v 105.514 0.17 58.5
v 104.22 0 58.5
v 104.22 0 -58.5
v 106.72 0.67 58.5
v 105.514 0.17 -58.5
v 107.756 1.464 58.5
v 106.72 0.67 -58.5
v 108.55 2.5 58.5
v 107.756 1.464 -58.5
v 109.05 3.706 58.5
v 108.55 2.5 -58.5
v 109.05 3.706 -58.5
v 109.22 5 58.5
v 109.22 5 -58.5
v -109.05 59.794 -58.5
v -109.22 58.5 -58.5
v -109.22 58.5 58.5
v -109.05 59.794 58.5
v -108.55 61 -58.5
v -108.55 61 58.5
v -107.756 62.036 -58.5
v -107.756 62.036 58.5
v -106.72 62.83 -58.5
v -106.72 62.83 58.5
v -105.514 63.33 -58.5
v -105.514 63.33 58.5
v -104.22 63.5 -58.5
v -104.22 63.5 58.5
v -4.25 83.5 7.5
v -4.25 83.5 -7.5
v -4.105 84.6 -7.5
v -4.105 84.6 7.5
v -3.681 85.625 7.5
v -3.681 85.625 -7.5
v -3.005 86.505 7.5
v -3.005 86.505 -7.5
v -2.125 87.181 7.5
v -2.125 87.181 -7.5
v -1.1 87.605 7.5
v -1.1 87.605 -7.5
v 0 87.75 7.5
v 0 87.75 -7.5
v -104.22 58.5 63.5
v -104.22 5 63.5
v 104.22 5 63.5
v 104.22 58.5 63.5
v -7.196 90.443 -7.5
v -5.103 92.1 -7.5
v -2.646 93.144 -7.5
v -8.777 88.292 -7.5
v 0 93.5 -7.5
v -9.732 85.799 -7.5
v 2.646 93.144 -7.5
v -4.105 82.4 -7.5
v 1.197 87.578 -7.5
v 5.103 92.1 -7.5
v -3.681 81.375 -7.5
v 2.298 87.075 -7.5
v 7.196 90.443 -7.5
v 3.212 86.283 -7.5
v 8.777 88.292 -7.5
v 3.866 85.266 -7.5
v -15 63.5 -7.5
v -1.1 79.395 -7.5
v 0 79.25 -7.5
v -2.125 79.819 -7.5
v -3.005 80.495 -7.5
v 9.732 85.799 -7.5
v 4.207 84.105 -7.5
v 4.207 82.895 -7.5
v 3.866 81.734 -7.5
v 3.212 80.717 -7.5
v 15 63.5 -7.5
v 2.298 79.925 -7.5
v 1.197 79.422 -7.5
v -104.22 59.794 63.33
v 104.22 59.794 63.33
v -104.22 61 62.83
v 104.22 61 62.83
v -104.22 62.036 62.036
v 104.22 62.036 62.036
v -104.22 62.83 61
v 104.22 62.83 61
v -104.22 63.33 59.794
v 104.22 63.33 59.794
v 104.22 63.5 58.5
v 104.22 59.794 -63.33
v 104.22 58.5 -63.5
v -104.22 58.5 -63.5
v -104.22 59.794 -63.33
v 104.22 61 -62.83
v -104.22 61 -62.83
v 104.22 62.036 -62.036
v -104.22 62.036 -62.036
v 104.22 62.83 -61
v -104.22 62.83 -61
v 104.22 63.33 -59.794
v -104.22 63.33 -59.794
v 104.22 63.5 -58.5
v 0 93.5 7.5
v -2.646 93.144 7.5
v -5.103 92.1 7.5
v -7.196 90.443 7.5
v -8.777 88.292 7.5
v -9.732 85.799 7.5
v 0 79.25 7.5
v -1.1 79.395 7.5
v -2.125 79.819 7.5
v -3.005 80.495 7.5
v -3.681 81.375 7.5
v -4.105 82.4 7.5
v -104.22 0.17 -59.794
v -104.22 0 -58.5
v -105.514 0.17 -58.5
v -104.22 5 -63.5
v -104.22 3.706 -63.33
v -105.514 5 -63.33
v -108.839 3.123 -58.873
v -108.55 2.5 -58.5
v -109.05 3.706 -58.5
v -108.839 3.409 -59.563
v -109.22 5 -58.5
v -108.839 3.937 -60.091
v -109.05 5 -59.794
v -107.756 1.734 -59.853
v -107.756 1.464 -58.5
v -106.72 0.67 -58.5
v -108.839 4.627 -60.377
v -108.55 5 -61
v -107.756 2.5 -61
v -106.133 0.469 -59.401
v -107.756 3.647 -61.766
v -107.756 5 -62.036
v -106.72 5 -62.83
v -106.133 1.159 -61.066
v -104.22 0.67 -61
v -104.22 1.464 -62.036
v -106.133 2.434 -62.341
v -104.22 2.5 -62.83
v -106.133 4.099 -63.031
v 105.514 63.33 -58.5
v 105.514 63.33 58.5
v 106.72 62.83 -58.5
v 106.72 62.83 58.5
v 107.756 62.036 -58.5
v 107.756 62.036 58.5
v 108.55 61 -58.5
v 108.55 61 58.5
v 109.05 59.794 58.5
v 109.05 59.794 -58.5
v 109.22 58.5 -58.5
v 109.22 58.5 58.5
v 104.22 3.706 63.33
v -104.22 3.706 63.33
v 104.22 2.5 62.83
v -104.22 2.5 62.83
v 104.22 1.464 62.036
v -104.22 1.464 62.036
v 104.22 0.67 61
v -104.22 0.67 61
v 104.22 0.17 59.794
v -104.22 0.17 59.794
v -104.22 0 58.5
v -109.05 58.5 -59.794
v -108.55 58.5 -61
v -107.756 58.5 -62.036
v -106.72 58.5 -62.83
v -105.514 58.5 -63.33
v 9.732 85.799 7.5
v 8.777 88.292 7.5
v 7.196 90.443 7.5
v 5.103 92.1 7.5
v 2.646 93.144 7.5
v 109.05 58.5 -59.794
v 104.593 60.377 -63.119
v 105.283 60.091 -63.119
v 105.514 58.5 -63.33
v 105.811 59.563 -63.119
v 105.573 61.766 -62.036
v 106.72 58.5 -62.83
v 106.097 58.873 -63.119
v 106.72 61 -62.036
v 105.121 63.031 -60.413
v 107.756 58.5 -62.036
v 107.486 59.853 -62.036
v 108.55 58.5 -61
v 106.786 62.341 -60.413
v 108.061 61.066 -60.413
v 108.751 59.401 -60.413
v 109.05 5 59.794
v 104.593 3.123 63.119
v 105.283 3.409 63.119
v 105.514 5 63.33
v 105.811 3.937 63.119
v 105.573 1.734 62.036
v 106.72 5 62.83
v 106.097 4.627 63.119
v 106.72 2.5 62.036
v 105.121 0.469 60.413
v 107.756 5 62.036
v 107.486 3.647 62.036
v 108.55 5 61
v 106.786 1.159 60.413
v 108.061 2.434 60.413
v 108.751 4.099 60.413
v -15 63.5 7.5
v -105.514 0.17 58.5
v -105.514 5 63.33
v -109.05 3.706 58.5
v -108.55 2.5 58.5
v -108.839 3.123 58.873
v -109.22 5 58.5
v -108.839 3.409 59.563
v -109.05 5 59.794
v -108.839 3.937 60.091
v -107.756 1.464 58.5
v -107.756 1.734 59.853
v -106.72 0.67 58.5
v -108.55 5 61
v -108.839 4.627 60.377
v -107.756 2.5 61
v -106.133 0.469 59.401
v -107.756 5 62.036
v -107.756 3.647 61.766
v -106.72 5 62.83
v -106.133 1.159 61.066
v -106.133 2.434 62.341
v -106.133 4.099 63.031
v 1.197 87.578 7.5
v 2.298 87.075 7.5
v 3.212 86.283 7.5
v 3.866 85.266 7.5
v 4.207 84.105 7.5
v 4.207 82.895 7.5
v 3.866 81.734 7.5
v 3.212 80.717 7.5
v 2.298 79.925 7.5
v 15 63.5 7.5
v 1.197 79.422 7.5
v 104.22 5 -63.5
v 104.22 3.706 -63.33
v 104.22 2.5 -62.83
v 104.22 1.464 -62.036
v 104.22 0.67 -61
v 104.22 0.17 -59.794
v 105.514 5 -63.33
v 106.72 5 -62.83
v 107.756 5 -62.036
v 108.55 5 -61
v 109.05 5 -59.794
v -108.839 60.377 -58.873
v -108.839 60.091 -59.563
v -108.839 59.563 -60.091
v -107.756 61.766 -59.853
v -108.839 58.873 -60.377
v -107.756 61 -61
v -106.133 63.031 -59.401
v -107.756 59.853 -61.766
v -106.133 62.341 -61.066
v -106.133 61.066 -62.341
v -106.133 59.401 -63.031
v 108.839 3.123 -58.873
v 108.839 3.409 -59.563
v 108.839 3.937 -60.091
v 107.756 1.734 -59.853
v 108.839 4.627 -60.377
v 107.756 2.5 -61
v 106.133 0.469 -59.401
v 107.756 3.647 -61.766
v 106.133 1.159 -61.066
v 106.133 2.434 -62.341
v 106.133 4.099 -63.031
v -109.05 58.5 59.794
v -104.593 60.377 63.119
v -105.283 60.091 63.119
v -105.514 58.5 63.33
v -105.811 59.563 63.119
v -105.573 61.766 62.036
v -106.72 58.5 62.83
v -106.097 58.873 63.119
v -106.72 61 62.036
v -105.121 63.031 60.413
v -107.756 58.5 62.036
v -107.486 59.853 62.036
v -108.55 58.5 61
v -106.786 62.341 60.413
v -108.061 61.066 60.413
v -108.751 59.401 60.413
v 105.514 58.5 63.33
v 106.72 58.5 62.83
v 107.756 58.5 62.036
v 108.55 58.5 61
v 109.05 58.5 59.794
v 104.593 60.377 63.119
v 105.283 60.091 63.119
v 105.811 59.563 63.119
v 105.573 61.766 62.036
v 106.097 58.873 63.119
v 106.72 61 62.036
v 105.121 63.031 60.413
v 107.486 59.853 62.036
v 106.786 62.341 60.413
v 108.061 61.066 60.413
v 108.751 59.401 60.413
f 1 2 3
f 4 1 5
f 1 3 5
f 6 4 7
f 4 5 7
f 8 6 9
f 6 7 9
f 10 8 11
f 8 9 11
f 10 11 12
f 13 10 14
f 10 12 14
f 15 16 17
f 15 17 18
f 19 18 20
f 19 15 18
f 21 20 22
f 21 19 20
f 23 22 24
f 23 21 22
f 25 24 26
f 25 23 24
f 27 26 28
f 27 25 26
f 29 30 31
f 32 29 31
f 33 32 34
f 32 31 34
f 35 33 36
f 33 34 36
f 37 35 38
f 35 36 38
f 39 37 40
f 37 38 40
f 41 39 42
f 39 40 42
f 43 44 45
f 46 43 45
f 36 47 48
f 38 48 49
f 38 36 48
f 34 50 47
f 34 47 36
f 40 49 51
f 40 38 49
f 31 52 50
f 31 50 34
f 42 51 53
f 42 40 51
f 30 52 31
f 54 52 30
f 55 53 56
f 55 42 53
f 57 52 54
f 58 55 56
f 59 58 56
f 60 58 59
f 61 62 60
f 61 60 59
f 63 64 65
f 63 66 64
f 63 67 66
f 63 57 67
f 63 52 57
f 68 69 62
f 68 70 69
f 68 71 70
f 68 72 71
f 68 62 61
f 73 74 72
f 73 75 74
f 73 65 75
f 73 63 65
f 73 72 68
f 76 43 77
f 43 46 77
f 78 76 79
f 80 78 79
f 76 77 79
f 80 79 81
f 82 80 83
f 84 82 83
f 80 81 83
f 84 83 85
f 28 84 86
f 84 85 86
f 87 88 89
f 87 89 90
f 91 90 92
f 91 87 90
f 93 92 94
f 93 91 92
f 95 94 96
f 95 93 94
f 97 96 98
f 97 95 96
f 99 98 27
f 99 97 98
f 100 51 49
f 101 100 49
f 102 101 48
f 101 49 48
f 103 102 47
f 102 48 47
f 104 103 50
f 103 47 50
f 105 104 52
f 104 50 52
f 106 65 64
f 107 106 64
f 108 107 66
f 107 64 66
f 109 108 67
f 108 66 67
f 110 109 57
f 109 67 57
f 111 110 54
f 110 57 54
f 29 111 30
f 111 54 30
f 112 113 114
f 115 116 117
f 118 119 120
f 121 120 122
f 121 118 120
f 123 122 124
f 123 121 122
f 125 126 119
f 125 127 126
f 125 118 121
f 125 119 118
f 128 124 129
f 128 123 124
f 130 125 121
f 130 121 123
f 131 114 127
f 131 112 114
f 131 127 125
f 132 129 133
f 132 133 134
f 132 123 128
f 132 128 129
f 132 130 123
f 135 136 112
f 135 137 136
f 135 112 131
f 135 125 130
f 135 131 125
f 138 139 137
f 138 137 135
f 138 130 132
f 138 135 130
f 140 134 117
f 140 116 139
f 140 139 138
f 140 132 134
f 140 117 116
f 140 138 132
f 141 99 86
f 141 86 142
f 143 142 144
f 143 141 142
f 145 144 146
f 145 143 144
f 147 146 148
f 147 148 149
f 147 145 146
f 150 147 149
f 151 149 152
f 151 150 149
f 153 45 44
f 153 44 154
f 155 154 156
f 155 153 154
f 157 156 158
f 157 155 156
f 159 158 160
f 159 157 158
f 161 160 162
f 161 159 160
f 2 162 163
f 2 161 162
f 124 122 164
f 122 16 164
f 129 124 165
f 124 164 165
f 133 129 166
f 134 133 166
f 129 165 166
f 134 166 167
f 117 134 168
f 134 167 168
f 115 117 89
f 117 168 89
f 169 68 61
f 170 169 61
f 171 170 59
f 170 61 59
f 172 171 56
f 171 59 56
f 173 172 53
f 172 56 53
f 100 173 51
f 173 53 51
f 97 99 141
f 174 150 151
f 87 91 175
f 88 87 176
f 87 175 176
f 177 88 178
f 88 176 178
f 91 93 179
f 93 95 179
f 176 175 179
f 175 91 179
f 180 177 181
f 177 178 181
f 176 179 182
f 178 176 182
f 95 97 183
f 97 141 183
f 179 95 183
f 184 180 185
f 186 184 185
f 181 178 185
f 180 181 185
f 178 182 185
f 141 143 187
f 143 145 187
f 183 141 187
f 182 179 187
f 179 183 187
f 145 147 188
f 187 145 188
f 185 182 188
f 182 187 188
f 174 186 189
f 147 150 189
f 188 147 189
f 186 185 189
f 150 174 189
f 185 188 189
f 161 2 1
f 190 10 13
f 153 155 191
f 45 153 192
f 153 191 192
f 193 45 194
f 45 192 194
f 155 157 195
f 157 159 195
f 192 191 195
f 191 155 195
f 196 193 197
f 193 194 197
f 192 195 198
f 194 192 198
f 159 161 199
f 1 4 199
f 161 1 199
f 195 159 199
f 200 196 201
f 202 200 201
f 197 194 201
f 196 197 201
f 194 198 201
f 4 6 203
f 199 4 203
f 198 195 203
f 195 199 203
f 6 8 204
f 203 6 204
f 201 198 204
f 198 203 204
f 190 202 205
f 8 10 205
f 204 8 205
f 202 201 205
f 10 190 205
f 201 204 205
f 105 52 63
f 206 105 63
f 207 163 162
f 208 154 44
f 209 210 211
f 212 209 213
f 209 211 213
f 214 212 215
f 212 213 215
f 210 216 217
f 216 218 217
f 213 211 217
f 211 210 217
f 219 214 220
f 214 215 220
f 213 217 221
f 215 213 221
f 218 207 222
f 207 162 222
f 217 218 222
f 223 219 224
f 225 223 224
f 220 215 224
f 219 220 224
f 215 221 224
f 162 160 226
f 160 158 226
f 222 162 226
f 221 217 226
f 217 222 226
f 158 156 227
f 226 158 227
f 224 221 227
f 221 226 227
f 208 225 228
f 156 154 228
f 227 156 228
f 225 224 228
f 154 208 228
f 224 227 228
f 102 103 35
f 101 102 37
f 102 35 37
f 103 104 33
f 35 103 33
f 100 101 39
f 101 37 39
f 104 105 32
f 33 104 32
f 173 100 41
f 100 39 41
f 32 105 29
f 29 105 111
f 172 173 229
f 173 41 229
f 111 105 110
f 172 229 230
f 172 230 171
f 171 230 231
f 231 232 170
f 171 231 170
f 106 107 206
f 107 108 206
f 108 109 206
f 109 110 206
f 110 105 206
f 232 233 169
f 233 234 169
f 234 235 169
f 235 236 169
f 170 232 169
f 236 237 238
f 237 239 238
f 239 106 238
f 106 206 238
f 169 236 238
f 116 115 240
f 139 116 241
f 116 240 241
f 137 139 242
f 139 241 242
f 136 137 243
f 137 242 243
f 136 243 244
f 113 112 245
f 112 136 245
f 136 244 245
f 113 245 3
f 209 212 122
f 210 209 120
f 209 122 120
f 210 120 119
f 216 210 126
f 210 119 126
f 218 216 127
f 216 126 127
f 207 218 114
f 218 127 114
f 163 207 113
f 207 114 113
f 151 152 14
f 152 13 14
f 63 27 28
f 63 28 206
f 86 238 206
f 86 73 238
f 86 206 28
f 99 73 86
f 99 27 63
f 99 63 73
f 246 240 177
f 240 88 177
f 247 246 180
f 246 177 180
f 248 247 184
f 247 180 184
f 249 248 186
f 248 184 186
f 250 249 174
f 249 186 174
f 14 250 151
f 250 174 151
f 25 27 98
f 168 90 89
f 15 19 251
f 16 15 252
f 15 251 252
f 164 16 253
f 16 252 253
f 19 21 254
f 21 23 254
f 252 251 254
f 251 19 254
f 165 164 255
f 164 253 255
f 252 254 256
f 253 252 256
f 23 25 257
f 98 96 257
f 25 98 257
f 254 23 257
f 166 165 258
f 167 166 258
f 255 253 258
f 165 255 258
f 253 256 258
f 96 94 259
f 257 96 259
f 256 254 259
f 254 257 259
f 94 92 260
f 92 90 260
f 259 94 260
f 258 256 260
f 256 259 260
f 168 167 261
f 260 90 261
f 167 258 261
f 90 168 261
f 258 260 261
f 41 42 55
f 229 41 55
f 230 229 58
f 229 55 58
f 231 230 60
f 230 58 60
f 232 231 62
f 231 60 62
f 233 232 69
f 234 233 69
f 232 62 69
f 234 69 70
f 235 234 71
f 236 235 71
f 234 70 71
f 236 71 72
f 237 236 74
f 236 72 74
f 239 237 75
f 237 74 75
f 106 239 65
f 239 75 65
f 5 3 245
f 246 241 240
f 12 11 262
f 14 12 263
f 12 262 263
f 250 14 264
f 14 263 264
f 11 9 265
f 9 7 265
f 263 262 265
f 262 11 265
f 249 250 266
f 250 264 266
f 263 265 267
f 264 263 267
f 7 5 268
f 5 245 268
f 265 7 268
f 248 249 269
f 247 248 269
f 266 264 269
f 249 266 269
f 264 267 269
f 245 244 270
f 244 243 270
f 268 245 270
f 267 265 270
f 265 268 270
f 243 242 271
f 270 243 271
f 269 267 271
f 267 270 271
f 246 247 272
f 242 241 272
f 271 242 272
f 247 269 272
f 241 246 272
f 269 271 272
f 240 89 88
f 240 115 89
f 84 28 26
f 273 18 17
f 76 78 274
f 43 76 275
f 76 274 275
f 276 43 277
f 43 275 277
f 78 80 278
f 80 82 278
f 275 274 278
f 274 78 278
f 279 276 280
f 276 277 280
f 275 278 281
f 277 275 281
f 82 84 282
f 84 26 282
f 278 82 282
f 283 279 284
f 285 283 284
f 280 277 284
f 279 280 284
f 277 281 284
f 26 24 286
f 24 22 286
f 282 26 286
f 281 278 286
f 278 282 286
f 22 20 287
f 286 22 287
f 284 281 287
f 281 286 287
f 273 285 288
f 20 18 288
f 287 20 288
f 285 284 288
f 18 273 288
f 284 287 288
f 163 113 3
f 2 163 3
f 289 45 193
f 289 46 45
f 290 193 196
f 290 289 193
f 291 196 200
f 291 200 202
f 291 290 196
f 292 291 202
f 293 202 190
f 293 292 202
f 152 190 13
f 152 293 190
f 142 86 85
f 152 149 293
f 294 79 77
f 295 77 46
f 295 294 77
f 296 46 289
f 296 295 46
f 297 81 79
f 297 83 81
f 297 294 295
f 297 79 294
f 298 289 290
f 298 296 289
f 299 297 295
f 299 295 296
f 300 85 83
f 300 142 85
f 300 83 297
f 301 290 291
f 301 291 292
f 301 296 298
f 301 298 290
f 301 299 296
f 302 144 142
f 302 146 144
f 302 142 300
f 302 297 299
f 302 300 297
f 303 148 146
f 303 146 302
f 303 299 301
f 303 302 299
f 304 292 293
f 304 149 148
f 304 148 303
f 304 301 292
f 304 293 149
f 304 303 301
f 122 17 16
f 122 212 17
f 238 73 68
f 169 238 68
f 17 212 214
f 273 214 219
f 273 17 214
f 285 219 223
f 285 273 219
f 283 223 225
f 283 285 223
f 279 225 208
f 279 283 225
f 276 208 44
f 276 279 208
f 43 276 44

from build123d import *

# Parameters (mm, degrees)
SKETCH1_W           = 218.44
SKETCH1_H           = 127
BOSS_EXTRUDE1_DEPTH = 63.5
SKETCH2_W           = 30
SKETCH2_H           = 15
BOSS_EXTRUDE2_DEPTH = 30
CUT_EXTRUDE1_REACH  = 162.35
FILLET1_R           = 5


with BuildPart() as part:
    # Sketch1 → Boss-Extrude1 (new body)
    with BuildSketch(Plane(origin=(0, 0, 0), x_dir=(1, 0, 0), z_dir=(0, 1, 0))):
        Rectangle(SKETCH1_W, SKETCH1_H)
    extrude(amount=BOSS_EXTRUDE1_DEPTH)

    # Sketch2 → Boss-Extrude2 (add)
    with BuildSketch(Plane(origin=(0, 63.5, 0), x_dir=(1, 0, 0), z_dir=(0, 1, 0))):
        Rectangle(SKETCH2_W, SKETCH2_H)
    extrude(amount=BOSS_EXTRUDE2_DEPTH)

    # Sketch3 → Cut-Extrude1 (cut, up to next)
    with BuildSketch(Plane(origin=(0, 0, -7.5), x_dir=(-1, 0, 0), z_dir=(0, 0, -1)), mode=Mode.PRIVATE) as cut_extrude1_sk1:
        with BuildLine():
            ThreePointArc((4.25, 83.5), (3.00520382, 86.50520382), (0, 87.75))
            Line((0, 87.75), (0, 79.25))
            ThreePointArc((0, 79.25), (3.00520382, 80.49479618), (4.25, 83.5))
        make_face()
    cut_extrude1_tool1 = extrude(cut_extrude1_sk1.sketch, amount=-CUT_EXTRUDE1_REACH, mode=Mode.PRIVATE) & part.part
    # Sketch3 → Cut-Extrude1 (cut, up to next)
    with BuildSketch(Plane(origin=(0, 0, -7.5), x_dir=(-1, 0, 0), z_dir=(0, 0, -1)), mode=Mode.PRIVATE) as cut_extrude1_sk2:
        with BuildLine():
            Line((0, 79.25), (0, 87.75))
            ThreePointArc((0, 87.75), (-4.25, 83.5), (0, 79.25))
        make_face()
    cut_extrude1_tool2 = extrude(cut_extrude1_sk2.sketch, amount=-CUT_EXTRUDE1_REACH, mode=Mode.PRIVATE) & part.part
    # Sketch3 → Cut-Extrude1 (cut, up to next)
    with BuildSketch(Plane(origin=(0, 0, -7.5), x_dir=(-1, 0, 0), z_dir=(0, 0, -1)), mode=Mode.PRIVATE) as cut_extrude1_sk3:
        with BuildLine():
            ThreePointArc((4.25, 83.5), (3.00520382, 86.50520382), (0, 87.75))
            Line((0, 87.75), (0, 79.25))
            ThreePointArc((0, 79.25), (3.00520382, 80.49479618), (4.25, 83.5))
        make_face()
    cut_extrude1_tool3 = extrude(cut_extrude1_sk3.sketch, amount=-CUT_EXTRUDE1_REACH, mode=Mode.PRIVATE) & part.part
    # Sketch3 → Cut-Extrude1 (cut, up to next)
    with BuildSketch(Plane(origin=(0, 0, -7.5), x_dir=(-1, 0, 0), z_dir=(0, 0, -1)), mode=Mode.PRIVATE) as cut_extrude1_sk4:
        with BuildLine():
            Line((0, 79.25), (0, 87.75))
            ThreePointArc((0, 87.75), (-4.25, 83.5), (0, 79.25))
        make_face()
    cut_extrude1_tool4 = extrude(cut_extrude1_sk4.sketch, amount=-CUT_EXTRUDE1_REACH, mode=Mode.PRIVATE) & part.part
    # Sketch3 → Cut-Extrude1 (cut, up to next)
    with BuildSketch(Plane(origin=(0, 0, -7.5), x_dir=(-1, 0, 0), z_dir=(0, 0, -1)), mode=Mode.PRIVATE) as cut_extrude1_sk5:
        with BuildLine():
            Line((15, 93.5), (0, 93.5))
            ThreePointArc((0, 93.5), (6.205203126, 91.341903734), (9.732121112, 85.799090834))
            Line((9.732121112, 85.799090834), (15, 63.5))
            Line((15, 63.5), (15, 93.5))
        make_face()
    cut_extrude1_tool5 = extrude(cut_extrude1_sk5.sketch, amount=-CUT_EXTRUDE1_REACH, mode=Mode.PRIVATE) & part.part
    # Sketch3 → Cut-Extrude1 (cut, up to next)
    with BuildSketch(Plane(origin=(0, 0, -7.5), x_dir=(-1, 0, 0), z_dir=(0, 0, -1)), mode=Mode.PRIVATE) as cut_extrude1_sk6:
        with BuildLine():
            ThreePointArc((-9.732121112, 85.799090834), (-6.205203126, 91.341903734), (0, 93.5))
            Line((0, 93.5), (-15, 93.5))
            Line((-15, 93.5), (-15, 63.5))
            Line((-15, 63.5), (-9.732121112, 85.799090834))
        make_face()
    cut_extrude1_tool6 = extrude(cut_extrude1_sk6.sketch, amount=-CUT_EXTRUDE1_REACH, mode=Mode.PRIVATE) & part.part
    add(cut_extrude1_tool1.solids().sort_by_distance((-1.803756, 83.5, -7.5))[0], mode=Mode.SUBTRACT)
    add(cut_extrude1_tool2.solids().sort_by_distance((1.803756, 83.5, -7.5))[0], mode=Mode.SUBTRACT)
    add(cut_extrude1_tool3.solids().sort_by_distance((-1.803756, 83.5, -7.5))[0], mode=Mode.SUBTRACT)
    add(cut_extrude1_tool4.solids().sort_by_distance((1.803756, 83.5, -7.5))[0], mode=Mode.SUBTRACT)
    add(cut_extrude1_tool5.solids().sort_by_distance((-12.015946, 84.357088, -7.5))[0], mode=Mode.SUBTRACT)
    add(cut_extrude1_tool6.solids().sort_by_distance((12.015946, 84.357088, -7.5))[0], mode=Mode.SUBTRACT)

    # Fillet1
    fillet1_edges = [part.edges().sort_by_distance(p)[0] for p in [
        (109.22, 63.5, 0),
        (0, 63.5, -63.5),
        (-109.22, 63.5, 0),
        (0, 0, -63.5),
        (109.22, 0, 0),
        (0, 0, 63.5),
        (-109.22, 0, 0),
        (0, 63.5, 63.5),
        (-109.22, 31.75, -63.5),
        (109.22, 31.75, -63.5),
        (109.22, 31.75, 63.5),
        (-109.22, 31.75, 63.5),
    ]]
    fillet(fillet1_edges, radius=FILLET1_R)


solid = part.part
